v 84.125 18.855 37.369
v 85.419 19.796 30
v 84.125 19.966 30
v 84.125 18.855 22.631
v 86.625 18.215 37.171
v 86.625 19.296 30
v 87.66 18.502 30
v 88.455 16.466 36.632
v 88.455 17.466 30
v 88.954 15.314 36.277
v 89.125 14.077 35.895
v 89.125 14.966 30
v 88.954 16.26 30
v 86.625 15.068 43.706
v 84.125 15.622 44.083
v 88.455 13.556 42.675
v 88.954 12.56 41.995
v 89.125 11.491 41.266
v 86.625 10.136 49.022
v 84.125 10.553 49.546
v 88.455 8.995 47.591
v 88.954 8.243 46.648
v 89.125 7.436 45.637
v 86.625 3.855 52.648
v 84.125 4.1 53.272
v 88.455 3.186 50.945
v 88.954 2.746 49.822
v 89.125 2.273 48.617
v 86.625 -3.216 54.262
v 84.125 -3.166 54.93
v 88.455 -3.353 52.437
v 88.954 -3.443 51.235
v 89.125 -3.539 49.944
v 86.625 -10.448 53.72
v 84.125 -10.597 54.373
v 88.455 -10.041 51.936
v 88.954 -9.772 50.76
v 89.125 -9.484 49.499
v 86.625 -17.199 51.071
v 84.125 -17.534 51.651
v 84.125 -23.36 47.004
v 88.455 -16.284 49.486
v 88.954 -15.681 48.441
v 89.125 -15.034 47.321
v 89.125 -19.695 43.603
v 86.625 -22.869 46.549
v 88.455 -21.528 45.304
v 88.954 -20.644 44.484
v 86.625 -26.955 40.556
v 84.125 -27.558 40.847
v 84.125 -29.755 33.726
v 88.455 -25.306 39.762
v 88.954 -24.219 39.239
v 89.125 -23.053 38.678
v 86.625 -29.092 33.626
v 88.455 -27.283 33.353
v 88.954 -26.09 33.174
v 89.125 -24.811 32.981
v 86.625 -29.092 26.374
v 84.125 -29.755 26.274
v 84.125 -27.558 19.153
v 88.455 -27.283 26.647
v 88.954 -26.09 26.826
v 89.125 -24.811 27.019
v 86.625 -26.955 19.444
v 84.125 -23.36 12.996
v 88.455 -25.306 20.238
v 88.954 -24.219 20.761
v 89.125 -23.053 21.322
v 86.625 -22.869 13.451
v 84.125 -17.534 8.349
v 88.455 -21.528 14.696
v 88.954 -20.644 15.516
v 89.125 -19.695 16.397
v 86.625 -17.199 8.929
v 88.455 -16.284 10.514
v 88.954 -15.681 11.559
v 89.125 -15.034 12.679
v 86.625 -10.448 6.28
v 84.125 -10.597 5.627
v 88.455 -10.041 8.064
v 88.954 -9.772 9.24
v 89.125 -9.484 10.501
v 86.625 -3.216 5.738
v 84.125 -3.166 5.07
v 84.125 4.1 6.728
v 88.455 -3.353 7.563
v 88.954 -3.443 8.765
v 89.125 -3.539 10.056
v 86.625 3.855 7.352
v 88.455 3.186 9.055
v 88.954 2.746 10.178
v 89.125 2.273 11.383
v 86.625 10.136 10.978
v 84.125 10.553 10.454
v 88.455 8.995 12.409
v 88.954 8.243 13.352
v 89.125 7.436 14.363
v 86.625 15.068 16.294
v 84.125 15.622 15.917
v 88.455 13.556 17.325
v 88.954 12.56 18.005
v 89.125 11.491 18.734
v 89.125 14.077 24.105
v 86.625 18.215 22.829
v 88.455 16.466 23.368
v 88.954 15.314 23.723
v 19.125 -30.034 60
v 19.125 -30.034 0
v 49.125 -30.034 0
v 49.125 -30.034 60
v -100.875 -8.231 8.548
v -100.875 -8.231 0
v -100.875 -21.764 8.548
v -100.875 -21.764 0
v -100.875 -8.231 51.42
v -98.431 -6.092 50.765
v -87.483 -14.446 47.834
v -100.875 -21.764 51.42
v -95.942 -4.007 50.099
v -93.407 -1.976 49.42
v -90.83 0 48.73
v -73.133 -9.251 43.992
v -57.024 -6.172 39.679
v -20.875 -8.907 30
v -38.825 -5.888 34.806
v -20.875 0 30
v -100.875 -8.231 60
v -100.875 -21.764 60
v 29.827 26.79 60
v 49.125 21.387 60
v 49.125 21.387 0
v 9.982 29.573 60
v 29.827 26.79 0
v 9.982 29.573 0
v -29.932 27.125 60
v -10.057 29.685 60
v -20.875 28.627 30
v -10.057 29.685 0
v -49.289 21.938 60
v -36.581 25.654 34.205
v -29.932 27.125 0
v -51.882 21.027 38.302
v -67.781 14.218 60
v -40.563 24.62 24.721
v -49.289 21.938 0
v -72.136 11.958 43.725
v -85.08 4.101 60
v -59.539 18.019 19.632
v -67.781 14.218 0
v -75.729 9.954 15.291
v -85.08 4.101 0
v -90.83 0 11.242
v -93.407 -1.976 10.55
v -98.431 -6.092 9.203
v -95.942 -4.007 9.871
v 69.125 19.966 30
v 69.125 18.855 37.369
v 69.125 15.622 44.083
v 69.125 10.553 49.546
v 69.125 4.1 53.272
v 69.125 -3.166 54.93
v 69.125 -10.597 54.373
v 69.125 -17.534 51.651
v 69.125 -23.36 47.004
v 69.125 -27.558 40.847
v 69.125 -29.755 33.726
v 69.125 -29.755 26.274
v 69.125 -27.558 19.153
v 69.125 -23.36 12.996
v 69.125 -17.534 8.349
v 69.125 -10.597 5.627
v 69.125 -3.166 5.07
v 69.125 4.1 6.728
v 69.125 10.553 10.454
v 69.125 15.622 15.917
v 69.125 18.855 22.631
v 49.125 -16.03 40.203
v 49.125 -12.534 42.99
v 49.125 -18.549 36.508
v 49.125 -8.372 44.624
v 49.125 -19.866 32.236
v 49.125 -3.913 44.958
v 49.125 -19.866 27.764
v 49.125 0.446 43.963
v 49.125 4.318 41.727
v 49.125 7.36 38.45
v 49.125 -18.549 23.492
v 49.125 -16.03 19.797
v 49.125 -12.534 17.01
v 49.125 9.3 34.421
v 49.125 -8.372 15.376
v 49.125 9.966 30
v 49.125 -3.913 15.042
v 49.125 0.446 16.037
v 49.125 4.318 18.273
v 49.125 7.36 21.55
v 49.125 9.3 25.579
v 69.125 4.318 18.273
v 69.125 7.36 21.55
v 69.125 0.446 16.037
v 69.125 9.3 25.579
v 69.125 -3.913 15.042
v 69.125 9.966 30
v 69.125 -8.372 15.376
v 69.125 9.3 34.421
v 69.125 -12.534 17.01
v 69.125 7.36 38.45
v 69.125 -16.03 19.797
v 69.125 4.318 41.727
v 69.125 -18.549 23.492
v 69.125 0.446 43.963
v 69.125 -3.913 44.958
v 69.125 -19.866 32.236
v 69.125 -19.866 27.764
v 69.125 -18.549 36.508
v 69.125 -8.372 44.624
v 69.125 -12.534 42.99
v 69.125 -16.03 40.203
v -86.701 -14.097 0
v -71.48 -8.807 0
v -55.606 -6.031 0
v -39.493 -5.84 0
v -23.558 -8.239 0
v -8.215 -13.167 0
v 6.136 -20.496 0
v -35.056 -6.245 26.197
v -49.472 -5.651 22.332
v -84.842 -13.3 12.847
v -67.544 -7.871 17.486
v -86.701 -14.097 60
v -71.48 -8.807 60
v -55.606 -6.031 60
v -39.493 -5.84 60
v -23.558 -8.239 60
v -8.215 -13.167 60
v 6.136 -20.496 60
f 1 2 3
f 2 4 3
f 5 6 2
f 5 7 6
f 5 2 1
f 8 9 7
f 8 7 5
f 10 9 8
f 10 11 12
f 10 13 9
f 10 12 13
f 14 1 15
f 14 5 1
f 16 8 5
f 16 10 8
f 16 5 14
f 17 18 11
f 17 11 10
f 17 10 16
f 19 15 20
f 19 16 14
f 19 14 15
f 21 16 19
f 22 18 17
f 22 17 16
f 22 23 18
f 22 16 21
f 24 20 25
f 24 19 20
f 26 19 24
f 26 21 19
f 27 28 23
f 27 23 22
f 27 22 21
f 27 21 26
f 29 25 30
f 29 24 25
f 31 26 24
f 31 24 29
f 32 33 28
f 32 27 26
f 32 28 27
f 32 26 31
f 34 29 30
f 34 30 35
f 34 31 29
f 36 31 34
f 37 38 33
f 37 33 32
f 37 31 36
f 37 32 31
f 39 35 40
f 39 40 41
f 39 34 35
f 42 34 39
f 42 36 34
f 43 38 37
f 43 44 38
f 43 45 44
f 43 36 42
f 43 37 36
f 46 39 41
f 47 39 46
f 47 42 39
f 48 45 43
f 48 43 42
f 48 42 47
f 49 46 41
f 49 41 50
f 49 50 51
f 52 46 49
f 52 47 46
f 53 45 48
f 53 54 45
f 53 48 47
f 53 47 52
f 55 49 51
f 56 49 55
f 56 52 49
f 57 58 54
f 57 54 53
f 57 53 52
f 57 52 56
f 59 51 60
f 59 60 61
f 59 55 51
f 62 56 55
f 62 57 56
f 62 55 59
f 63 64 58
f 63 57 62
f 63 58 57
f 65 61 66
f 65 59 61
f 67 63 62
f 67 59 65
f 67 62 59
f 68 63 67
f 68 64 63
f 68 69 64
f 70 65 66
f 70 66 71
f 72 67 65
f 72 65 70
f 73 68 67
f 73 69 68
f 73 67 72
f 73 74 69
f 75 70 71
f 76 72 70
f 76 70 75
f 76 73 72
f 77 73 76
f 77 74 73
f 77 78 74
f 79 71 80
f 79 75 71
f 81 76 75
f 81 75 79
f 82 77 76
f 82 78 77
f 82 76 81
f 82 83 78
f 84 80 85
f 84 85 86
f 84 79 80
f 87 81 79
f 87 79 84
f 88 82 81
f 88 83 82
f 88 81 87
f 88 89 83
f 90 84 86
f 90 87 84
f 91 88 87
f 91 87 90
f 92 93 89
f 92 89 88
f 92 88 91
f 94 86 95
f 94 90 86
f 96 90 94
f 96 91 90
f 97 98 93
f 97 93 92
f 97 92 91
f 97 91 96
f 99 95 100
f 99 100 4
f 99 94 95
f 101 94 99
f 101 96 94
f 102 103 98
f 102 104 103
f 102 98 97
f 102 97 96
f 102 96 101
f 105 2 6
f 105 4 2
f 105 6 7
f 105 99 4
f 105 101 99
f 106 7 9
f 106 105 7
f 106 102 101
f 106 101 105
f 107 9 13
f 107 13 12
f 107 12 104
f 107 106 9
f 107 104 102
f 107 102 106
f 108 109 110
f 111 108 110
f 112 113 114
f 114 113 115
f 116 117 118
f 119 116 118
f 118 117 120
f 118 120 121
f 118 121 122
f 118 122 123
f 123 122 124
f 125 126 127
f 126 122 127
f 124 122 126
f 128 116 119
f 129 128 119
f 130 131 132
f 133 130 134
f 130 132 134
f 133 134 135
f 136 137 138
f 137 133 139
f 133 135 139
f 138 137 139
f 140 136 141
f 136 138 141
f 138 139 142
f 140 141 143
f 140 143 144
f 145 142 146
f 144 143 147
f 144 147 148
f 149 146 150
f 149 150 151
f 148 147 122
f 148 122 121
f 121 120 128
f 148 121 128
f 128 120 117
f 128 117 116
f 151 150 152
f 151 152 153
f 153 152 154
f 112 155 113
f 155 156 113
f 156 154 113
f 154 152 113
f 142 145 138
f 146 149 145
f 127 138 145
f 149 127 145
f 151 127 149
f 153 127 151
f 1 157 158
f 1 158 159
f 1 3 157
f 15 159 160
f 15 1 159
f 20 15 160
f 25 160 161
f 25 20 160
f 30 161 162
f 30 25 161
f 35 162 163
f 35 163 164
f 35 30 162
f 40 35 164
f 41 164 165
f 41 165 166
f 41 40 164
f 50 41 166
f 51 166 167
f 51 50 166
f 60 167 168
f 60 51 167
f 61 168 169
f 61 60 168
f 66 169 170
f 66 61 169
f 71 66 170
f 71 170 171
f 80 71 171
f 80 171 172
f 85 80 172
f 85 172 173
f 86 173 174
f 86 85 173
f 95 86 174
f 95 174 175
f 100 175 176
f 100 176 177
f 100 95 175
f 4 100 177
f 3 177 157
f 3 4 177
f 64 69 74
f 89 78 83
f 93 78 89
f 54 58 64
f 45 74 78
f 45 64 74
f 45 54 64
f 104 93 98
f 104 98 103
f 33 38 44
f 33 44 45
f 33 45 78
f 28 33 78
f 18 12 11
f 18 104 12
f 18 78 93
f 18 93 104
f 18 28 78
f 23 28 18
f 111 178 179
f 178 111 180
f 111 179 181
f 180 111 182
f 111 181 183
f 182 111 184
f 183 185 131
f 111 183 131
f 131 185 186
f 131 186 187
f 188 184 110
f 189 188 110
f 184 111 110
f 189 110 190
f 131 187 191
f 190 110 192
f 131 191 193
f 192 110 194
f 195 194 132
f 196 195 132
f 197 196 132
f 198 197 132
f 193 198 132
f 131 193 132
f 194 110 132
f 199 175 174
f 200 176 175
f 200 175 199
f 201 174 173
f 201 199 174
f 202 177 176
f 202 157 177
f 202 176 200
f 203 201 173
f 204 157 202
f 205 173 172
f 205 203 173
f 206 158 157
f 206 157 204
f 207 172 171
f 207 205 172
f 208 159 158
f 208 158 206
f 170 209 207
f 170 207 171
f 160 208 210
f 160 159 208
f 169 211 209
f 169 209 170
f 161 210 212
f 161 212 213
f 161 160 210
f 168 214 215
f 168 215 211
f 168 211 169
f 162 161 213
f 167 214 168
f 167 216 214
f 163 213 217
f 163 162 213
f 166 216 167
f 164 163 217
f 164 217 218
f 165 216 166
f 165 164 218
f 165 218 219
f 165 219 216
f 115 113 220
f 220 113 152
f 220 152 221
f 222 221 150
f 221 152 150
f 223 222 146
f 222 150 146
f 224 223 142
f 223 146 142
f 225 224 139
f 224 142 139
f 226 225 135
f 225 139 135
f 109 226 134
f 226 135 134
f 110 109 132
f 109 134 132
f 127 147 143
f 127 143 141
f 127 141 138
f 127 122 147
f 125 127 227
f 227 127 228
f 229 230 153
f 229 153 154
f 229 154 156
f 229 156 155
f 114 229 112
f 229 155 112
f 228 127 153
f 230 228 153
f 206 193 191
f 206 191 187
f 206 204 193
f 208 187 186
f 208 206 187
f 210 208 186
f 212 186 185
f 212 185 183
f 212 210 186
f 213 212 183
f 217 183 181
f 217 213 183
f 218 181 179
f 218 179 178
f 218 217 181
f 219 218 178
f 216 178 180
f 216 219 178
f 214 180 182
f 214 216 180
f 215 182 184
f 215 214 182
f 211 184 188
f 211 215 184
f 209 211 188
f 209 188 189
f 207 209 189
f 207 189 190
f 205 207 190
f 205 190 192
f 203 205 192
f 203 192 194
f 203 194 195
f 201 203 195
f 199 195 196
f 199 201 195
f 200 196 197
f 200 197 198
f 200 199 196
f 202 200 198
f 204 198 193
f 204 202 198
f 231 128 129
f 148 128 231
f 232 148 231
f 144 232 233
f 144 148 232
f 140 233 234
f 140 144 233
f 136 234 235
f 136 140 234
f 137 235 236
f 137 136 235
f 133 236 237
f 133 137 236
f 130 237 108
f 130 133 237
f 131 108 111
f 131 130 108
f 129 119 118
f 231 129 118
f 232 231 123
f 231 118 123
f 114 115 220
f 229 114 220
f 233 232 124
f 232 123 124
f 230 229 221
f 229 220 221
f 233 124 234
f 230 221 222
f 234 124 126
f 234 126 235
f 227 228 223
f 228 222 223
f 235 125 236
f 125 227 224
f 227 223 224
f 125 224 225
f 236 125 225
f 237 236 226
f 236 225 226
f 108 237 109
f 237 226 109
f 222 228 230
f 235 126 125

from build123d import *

# Parameters (mm, degrees)
BOSS_EXTRUDE1_DEPTH = 60
CUT_EXTRUDE1_DEPTH  = 50
CUT_EXTRUDE2_DEPTH  = 50


with BuildPart() as part:
    # Sketch1 → Boss-Extrude1 (new body)
    with BuildSketch(Plane.XY):
        with BuildLine():
            Line((49.124764621, -30.033995939), (49.124764621, 21.387360298))
            ThreePointArc((49.124764621, 21.387360298), (-29.932176884, 27.124741995), (-100.875235379, -8.230597064))
            Line((-100.875235379, -8.230597064), (-100.875235379, -21.76381536))
            ThreePointArc((-100.875235379, -21.76381536), (-39.492781079, -5.839547279), (19.124764621, -30.033995939))
            Line((19.124764621, -30.033995939), (49.124764621, -30.033995939))
        make_face()
    extrude(amount=BOSS_EXTRUDE1_DEPTH)

    # Sketch3 → Revolve1 (revolve)
    with BuildSketch(Plane.XY.offset(30)):
        with BuildLine():
            Line((49.124764621, -5.033995939), (49.124764621, 9.966004061))
            Line((49.124764621, 9.966004061), (69.124764621, 9.966004061))
            Line((69.124764621, 9.966004061), (69.124764621, 19.966004061))
            Line((69.124764621, 19.966004061), (84.124764621, 19.966004061))
            ThreePointArc((84.124764621, 19.966004061), (87.660298526, 18.501537967), (89.124764621, 14.966004061))
            Line((89.124764621, 14.966004061), (89.124764621, -5.033995939))
            Line((89.124764621, -5.033995939), (49.124764621, -5.033995939))
        make_face()
    revolve(axis=Axis((49.124764621, -5.033995939, 30), (1, 0, 0)))

    # Sketch5 → Cut-Extrude1 (cut)
    with BuildSketch(Plane(origin=(0, 0, 0), x_dir=(1, 0, 0), z_dir=(0, 1, 0))):
        Polygon((-100.875235379, -8.547870984), (-100.875235379, -51.419743412), (-20.875235379, -30), align=None)
    extrude(amount=-CUT_EXTRUDE1_DEPTH, mode=Mode.SUBTRACT)

    # Sketch6 → Cut-Extrude2 (cut)
    with BuildSketch(Plane.XZ):
        Polygon((-90.829889616, 48.730134303), (-20.875235379, 30), (-90.829889616, 11.24154665), align=None)
    extrude(amount=-CUT_EXTRUDE2_DEPTH, mode=Mode.SUBTRACT)


solid = part.part
